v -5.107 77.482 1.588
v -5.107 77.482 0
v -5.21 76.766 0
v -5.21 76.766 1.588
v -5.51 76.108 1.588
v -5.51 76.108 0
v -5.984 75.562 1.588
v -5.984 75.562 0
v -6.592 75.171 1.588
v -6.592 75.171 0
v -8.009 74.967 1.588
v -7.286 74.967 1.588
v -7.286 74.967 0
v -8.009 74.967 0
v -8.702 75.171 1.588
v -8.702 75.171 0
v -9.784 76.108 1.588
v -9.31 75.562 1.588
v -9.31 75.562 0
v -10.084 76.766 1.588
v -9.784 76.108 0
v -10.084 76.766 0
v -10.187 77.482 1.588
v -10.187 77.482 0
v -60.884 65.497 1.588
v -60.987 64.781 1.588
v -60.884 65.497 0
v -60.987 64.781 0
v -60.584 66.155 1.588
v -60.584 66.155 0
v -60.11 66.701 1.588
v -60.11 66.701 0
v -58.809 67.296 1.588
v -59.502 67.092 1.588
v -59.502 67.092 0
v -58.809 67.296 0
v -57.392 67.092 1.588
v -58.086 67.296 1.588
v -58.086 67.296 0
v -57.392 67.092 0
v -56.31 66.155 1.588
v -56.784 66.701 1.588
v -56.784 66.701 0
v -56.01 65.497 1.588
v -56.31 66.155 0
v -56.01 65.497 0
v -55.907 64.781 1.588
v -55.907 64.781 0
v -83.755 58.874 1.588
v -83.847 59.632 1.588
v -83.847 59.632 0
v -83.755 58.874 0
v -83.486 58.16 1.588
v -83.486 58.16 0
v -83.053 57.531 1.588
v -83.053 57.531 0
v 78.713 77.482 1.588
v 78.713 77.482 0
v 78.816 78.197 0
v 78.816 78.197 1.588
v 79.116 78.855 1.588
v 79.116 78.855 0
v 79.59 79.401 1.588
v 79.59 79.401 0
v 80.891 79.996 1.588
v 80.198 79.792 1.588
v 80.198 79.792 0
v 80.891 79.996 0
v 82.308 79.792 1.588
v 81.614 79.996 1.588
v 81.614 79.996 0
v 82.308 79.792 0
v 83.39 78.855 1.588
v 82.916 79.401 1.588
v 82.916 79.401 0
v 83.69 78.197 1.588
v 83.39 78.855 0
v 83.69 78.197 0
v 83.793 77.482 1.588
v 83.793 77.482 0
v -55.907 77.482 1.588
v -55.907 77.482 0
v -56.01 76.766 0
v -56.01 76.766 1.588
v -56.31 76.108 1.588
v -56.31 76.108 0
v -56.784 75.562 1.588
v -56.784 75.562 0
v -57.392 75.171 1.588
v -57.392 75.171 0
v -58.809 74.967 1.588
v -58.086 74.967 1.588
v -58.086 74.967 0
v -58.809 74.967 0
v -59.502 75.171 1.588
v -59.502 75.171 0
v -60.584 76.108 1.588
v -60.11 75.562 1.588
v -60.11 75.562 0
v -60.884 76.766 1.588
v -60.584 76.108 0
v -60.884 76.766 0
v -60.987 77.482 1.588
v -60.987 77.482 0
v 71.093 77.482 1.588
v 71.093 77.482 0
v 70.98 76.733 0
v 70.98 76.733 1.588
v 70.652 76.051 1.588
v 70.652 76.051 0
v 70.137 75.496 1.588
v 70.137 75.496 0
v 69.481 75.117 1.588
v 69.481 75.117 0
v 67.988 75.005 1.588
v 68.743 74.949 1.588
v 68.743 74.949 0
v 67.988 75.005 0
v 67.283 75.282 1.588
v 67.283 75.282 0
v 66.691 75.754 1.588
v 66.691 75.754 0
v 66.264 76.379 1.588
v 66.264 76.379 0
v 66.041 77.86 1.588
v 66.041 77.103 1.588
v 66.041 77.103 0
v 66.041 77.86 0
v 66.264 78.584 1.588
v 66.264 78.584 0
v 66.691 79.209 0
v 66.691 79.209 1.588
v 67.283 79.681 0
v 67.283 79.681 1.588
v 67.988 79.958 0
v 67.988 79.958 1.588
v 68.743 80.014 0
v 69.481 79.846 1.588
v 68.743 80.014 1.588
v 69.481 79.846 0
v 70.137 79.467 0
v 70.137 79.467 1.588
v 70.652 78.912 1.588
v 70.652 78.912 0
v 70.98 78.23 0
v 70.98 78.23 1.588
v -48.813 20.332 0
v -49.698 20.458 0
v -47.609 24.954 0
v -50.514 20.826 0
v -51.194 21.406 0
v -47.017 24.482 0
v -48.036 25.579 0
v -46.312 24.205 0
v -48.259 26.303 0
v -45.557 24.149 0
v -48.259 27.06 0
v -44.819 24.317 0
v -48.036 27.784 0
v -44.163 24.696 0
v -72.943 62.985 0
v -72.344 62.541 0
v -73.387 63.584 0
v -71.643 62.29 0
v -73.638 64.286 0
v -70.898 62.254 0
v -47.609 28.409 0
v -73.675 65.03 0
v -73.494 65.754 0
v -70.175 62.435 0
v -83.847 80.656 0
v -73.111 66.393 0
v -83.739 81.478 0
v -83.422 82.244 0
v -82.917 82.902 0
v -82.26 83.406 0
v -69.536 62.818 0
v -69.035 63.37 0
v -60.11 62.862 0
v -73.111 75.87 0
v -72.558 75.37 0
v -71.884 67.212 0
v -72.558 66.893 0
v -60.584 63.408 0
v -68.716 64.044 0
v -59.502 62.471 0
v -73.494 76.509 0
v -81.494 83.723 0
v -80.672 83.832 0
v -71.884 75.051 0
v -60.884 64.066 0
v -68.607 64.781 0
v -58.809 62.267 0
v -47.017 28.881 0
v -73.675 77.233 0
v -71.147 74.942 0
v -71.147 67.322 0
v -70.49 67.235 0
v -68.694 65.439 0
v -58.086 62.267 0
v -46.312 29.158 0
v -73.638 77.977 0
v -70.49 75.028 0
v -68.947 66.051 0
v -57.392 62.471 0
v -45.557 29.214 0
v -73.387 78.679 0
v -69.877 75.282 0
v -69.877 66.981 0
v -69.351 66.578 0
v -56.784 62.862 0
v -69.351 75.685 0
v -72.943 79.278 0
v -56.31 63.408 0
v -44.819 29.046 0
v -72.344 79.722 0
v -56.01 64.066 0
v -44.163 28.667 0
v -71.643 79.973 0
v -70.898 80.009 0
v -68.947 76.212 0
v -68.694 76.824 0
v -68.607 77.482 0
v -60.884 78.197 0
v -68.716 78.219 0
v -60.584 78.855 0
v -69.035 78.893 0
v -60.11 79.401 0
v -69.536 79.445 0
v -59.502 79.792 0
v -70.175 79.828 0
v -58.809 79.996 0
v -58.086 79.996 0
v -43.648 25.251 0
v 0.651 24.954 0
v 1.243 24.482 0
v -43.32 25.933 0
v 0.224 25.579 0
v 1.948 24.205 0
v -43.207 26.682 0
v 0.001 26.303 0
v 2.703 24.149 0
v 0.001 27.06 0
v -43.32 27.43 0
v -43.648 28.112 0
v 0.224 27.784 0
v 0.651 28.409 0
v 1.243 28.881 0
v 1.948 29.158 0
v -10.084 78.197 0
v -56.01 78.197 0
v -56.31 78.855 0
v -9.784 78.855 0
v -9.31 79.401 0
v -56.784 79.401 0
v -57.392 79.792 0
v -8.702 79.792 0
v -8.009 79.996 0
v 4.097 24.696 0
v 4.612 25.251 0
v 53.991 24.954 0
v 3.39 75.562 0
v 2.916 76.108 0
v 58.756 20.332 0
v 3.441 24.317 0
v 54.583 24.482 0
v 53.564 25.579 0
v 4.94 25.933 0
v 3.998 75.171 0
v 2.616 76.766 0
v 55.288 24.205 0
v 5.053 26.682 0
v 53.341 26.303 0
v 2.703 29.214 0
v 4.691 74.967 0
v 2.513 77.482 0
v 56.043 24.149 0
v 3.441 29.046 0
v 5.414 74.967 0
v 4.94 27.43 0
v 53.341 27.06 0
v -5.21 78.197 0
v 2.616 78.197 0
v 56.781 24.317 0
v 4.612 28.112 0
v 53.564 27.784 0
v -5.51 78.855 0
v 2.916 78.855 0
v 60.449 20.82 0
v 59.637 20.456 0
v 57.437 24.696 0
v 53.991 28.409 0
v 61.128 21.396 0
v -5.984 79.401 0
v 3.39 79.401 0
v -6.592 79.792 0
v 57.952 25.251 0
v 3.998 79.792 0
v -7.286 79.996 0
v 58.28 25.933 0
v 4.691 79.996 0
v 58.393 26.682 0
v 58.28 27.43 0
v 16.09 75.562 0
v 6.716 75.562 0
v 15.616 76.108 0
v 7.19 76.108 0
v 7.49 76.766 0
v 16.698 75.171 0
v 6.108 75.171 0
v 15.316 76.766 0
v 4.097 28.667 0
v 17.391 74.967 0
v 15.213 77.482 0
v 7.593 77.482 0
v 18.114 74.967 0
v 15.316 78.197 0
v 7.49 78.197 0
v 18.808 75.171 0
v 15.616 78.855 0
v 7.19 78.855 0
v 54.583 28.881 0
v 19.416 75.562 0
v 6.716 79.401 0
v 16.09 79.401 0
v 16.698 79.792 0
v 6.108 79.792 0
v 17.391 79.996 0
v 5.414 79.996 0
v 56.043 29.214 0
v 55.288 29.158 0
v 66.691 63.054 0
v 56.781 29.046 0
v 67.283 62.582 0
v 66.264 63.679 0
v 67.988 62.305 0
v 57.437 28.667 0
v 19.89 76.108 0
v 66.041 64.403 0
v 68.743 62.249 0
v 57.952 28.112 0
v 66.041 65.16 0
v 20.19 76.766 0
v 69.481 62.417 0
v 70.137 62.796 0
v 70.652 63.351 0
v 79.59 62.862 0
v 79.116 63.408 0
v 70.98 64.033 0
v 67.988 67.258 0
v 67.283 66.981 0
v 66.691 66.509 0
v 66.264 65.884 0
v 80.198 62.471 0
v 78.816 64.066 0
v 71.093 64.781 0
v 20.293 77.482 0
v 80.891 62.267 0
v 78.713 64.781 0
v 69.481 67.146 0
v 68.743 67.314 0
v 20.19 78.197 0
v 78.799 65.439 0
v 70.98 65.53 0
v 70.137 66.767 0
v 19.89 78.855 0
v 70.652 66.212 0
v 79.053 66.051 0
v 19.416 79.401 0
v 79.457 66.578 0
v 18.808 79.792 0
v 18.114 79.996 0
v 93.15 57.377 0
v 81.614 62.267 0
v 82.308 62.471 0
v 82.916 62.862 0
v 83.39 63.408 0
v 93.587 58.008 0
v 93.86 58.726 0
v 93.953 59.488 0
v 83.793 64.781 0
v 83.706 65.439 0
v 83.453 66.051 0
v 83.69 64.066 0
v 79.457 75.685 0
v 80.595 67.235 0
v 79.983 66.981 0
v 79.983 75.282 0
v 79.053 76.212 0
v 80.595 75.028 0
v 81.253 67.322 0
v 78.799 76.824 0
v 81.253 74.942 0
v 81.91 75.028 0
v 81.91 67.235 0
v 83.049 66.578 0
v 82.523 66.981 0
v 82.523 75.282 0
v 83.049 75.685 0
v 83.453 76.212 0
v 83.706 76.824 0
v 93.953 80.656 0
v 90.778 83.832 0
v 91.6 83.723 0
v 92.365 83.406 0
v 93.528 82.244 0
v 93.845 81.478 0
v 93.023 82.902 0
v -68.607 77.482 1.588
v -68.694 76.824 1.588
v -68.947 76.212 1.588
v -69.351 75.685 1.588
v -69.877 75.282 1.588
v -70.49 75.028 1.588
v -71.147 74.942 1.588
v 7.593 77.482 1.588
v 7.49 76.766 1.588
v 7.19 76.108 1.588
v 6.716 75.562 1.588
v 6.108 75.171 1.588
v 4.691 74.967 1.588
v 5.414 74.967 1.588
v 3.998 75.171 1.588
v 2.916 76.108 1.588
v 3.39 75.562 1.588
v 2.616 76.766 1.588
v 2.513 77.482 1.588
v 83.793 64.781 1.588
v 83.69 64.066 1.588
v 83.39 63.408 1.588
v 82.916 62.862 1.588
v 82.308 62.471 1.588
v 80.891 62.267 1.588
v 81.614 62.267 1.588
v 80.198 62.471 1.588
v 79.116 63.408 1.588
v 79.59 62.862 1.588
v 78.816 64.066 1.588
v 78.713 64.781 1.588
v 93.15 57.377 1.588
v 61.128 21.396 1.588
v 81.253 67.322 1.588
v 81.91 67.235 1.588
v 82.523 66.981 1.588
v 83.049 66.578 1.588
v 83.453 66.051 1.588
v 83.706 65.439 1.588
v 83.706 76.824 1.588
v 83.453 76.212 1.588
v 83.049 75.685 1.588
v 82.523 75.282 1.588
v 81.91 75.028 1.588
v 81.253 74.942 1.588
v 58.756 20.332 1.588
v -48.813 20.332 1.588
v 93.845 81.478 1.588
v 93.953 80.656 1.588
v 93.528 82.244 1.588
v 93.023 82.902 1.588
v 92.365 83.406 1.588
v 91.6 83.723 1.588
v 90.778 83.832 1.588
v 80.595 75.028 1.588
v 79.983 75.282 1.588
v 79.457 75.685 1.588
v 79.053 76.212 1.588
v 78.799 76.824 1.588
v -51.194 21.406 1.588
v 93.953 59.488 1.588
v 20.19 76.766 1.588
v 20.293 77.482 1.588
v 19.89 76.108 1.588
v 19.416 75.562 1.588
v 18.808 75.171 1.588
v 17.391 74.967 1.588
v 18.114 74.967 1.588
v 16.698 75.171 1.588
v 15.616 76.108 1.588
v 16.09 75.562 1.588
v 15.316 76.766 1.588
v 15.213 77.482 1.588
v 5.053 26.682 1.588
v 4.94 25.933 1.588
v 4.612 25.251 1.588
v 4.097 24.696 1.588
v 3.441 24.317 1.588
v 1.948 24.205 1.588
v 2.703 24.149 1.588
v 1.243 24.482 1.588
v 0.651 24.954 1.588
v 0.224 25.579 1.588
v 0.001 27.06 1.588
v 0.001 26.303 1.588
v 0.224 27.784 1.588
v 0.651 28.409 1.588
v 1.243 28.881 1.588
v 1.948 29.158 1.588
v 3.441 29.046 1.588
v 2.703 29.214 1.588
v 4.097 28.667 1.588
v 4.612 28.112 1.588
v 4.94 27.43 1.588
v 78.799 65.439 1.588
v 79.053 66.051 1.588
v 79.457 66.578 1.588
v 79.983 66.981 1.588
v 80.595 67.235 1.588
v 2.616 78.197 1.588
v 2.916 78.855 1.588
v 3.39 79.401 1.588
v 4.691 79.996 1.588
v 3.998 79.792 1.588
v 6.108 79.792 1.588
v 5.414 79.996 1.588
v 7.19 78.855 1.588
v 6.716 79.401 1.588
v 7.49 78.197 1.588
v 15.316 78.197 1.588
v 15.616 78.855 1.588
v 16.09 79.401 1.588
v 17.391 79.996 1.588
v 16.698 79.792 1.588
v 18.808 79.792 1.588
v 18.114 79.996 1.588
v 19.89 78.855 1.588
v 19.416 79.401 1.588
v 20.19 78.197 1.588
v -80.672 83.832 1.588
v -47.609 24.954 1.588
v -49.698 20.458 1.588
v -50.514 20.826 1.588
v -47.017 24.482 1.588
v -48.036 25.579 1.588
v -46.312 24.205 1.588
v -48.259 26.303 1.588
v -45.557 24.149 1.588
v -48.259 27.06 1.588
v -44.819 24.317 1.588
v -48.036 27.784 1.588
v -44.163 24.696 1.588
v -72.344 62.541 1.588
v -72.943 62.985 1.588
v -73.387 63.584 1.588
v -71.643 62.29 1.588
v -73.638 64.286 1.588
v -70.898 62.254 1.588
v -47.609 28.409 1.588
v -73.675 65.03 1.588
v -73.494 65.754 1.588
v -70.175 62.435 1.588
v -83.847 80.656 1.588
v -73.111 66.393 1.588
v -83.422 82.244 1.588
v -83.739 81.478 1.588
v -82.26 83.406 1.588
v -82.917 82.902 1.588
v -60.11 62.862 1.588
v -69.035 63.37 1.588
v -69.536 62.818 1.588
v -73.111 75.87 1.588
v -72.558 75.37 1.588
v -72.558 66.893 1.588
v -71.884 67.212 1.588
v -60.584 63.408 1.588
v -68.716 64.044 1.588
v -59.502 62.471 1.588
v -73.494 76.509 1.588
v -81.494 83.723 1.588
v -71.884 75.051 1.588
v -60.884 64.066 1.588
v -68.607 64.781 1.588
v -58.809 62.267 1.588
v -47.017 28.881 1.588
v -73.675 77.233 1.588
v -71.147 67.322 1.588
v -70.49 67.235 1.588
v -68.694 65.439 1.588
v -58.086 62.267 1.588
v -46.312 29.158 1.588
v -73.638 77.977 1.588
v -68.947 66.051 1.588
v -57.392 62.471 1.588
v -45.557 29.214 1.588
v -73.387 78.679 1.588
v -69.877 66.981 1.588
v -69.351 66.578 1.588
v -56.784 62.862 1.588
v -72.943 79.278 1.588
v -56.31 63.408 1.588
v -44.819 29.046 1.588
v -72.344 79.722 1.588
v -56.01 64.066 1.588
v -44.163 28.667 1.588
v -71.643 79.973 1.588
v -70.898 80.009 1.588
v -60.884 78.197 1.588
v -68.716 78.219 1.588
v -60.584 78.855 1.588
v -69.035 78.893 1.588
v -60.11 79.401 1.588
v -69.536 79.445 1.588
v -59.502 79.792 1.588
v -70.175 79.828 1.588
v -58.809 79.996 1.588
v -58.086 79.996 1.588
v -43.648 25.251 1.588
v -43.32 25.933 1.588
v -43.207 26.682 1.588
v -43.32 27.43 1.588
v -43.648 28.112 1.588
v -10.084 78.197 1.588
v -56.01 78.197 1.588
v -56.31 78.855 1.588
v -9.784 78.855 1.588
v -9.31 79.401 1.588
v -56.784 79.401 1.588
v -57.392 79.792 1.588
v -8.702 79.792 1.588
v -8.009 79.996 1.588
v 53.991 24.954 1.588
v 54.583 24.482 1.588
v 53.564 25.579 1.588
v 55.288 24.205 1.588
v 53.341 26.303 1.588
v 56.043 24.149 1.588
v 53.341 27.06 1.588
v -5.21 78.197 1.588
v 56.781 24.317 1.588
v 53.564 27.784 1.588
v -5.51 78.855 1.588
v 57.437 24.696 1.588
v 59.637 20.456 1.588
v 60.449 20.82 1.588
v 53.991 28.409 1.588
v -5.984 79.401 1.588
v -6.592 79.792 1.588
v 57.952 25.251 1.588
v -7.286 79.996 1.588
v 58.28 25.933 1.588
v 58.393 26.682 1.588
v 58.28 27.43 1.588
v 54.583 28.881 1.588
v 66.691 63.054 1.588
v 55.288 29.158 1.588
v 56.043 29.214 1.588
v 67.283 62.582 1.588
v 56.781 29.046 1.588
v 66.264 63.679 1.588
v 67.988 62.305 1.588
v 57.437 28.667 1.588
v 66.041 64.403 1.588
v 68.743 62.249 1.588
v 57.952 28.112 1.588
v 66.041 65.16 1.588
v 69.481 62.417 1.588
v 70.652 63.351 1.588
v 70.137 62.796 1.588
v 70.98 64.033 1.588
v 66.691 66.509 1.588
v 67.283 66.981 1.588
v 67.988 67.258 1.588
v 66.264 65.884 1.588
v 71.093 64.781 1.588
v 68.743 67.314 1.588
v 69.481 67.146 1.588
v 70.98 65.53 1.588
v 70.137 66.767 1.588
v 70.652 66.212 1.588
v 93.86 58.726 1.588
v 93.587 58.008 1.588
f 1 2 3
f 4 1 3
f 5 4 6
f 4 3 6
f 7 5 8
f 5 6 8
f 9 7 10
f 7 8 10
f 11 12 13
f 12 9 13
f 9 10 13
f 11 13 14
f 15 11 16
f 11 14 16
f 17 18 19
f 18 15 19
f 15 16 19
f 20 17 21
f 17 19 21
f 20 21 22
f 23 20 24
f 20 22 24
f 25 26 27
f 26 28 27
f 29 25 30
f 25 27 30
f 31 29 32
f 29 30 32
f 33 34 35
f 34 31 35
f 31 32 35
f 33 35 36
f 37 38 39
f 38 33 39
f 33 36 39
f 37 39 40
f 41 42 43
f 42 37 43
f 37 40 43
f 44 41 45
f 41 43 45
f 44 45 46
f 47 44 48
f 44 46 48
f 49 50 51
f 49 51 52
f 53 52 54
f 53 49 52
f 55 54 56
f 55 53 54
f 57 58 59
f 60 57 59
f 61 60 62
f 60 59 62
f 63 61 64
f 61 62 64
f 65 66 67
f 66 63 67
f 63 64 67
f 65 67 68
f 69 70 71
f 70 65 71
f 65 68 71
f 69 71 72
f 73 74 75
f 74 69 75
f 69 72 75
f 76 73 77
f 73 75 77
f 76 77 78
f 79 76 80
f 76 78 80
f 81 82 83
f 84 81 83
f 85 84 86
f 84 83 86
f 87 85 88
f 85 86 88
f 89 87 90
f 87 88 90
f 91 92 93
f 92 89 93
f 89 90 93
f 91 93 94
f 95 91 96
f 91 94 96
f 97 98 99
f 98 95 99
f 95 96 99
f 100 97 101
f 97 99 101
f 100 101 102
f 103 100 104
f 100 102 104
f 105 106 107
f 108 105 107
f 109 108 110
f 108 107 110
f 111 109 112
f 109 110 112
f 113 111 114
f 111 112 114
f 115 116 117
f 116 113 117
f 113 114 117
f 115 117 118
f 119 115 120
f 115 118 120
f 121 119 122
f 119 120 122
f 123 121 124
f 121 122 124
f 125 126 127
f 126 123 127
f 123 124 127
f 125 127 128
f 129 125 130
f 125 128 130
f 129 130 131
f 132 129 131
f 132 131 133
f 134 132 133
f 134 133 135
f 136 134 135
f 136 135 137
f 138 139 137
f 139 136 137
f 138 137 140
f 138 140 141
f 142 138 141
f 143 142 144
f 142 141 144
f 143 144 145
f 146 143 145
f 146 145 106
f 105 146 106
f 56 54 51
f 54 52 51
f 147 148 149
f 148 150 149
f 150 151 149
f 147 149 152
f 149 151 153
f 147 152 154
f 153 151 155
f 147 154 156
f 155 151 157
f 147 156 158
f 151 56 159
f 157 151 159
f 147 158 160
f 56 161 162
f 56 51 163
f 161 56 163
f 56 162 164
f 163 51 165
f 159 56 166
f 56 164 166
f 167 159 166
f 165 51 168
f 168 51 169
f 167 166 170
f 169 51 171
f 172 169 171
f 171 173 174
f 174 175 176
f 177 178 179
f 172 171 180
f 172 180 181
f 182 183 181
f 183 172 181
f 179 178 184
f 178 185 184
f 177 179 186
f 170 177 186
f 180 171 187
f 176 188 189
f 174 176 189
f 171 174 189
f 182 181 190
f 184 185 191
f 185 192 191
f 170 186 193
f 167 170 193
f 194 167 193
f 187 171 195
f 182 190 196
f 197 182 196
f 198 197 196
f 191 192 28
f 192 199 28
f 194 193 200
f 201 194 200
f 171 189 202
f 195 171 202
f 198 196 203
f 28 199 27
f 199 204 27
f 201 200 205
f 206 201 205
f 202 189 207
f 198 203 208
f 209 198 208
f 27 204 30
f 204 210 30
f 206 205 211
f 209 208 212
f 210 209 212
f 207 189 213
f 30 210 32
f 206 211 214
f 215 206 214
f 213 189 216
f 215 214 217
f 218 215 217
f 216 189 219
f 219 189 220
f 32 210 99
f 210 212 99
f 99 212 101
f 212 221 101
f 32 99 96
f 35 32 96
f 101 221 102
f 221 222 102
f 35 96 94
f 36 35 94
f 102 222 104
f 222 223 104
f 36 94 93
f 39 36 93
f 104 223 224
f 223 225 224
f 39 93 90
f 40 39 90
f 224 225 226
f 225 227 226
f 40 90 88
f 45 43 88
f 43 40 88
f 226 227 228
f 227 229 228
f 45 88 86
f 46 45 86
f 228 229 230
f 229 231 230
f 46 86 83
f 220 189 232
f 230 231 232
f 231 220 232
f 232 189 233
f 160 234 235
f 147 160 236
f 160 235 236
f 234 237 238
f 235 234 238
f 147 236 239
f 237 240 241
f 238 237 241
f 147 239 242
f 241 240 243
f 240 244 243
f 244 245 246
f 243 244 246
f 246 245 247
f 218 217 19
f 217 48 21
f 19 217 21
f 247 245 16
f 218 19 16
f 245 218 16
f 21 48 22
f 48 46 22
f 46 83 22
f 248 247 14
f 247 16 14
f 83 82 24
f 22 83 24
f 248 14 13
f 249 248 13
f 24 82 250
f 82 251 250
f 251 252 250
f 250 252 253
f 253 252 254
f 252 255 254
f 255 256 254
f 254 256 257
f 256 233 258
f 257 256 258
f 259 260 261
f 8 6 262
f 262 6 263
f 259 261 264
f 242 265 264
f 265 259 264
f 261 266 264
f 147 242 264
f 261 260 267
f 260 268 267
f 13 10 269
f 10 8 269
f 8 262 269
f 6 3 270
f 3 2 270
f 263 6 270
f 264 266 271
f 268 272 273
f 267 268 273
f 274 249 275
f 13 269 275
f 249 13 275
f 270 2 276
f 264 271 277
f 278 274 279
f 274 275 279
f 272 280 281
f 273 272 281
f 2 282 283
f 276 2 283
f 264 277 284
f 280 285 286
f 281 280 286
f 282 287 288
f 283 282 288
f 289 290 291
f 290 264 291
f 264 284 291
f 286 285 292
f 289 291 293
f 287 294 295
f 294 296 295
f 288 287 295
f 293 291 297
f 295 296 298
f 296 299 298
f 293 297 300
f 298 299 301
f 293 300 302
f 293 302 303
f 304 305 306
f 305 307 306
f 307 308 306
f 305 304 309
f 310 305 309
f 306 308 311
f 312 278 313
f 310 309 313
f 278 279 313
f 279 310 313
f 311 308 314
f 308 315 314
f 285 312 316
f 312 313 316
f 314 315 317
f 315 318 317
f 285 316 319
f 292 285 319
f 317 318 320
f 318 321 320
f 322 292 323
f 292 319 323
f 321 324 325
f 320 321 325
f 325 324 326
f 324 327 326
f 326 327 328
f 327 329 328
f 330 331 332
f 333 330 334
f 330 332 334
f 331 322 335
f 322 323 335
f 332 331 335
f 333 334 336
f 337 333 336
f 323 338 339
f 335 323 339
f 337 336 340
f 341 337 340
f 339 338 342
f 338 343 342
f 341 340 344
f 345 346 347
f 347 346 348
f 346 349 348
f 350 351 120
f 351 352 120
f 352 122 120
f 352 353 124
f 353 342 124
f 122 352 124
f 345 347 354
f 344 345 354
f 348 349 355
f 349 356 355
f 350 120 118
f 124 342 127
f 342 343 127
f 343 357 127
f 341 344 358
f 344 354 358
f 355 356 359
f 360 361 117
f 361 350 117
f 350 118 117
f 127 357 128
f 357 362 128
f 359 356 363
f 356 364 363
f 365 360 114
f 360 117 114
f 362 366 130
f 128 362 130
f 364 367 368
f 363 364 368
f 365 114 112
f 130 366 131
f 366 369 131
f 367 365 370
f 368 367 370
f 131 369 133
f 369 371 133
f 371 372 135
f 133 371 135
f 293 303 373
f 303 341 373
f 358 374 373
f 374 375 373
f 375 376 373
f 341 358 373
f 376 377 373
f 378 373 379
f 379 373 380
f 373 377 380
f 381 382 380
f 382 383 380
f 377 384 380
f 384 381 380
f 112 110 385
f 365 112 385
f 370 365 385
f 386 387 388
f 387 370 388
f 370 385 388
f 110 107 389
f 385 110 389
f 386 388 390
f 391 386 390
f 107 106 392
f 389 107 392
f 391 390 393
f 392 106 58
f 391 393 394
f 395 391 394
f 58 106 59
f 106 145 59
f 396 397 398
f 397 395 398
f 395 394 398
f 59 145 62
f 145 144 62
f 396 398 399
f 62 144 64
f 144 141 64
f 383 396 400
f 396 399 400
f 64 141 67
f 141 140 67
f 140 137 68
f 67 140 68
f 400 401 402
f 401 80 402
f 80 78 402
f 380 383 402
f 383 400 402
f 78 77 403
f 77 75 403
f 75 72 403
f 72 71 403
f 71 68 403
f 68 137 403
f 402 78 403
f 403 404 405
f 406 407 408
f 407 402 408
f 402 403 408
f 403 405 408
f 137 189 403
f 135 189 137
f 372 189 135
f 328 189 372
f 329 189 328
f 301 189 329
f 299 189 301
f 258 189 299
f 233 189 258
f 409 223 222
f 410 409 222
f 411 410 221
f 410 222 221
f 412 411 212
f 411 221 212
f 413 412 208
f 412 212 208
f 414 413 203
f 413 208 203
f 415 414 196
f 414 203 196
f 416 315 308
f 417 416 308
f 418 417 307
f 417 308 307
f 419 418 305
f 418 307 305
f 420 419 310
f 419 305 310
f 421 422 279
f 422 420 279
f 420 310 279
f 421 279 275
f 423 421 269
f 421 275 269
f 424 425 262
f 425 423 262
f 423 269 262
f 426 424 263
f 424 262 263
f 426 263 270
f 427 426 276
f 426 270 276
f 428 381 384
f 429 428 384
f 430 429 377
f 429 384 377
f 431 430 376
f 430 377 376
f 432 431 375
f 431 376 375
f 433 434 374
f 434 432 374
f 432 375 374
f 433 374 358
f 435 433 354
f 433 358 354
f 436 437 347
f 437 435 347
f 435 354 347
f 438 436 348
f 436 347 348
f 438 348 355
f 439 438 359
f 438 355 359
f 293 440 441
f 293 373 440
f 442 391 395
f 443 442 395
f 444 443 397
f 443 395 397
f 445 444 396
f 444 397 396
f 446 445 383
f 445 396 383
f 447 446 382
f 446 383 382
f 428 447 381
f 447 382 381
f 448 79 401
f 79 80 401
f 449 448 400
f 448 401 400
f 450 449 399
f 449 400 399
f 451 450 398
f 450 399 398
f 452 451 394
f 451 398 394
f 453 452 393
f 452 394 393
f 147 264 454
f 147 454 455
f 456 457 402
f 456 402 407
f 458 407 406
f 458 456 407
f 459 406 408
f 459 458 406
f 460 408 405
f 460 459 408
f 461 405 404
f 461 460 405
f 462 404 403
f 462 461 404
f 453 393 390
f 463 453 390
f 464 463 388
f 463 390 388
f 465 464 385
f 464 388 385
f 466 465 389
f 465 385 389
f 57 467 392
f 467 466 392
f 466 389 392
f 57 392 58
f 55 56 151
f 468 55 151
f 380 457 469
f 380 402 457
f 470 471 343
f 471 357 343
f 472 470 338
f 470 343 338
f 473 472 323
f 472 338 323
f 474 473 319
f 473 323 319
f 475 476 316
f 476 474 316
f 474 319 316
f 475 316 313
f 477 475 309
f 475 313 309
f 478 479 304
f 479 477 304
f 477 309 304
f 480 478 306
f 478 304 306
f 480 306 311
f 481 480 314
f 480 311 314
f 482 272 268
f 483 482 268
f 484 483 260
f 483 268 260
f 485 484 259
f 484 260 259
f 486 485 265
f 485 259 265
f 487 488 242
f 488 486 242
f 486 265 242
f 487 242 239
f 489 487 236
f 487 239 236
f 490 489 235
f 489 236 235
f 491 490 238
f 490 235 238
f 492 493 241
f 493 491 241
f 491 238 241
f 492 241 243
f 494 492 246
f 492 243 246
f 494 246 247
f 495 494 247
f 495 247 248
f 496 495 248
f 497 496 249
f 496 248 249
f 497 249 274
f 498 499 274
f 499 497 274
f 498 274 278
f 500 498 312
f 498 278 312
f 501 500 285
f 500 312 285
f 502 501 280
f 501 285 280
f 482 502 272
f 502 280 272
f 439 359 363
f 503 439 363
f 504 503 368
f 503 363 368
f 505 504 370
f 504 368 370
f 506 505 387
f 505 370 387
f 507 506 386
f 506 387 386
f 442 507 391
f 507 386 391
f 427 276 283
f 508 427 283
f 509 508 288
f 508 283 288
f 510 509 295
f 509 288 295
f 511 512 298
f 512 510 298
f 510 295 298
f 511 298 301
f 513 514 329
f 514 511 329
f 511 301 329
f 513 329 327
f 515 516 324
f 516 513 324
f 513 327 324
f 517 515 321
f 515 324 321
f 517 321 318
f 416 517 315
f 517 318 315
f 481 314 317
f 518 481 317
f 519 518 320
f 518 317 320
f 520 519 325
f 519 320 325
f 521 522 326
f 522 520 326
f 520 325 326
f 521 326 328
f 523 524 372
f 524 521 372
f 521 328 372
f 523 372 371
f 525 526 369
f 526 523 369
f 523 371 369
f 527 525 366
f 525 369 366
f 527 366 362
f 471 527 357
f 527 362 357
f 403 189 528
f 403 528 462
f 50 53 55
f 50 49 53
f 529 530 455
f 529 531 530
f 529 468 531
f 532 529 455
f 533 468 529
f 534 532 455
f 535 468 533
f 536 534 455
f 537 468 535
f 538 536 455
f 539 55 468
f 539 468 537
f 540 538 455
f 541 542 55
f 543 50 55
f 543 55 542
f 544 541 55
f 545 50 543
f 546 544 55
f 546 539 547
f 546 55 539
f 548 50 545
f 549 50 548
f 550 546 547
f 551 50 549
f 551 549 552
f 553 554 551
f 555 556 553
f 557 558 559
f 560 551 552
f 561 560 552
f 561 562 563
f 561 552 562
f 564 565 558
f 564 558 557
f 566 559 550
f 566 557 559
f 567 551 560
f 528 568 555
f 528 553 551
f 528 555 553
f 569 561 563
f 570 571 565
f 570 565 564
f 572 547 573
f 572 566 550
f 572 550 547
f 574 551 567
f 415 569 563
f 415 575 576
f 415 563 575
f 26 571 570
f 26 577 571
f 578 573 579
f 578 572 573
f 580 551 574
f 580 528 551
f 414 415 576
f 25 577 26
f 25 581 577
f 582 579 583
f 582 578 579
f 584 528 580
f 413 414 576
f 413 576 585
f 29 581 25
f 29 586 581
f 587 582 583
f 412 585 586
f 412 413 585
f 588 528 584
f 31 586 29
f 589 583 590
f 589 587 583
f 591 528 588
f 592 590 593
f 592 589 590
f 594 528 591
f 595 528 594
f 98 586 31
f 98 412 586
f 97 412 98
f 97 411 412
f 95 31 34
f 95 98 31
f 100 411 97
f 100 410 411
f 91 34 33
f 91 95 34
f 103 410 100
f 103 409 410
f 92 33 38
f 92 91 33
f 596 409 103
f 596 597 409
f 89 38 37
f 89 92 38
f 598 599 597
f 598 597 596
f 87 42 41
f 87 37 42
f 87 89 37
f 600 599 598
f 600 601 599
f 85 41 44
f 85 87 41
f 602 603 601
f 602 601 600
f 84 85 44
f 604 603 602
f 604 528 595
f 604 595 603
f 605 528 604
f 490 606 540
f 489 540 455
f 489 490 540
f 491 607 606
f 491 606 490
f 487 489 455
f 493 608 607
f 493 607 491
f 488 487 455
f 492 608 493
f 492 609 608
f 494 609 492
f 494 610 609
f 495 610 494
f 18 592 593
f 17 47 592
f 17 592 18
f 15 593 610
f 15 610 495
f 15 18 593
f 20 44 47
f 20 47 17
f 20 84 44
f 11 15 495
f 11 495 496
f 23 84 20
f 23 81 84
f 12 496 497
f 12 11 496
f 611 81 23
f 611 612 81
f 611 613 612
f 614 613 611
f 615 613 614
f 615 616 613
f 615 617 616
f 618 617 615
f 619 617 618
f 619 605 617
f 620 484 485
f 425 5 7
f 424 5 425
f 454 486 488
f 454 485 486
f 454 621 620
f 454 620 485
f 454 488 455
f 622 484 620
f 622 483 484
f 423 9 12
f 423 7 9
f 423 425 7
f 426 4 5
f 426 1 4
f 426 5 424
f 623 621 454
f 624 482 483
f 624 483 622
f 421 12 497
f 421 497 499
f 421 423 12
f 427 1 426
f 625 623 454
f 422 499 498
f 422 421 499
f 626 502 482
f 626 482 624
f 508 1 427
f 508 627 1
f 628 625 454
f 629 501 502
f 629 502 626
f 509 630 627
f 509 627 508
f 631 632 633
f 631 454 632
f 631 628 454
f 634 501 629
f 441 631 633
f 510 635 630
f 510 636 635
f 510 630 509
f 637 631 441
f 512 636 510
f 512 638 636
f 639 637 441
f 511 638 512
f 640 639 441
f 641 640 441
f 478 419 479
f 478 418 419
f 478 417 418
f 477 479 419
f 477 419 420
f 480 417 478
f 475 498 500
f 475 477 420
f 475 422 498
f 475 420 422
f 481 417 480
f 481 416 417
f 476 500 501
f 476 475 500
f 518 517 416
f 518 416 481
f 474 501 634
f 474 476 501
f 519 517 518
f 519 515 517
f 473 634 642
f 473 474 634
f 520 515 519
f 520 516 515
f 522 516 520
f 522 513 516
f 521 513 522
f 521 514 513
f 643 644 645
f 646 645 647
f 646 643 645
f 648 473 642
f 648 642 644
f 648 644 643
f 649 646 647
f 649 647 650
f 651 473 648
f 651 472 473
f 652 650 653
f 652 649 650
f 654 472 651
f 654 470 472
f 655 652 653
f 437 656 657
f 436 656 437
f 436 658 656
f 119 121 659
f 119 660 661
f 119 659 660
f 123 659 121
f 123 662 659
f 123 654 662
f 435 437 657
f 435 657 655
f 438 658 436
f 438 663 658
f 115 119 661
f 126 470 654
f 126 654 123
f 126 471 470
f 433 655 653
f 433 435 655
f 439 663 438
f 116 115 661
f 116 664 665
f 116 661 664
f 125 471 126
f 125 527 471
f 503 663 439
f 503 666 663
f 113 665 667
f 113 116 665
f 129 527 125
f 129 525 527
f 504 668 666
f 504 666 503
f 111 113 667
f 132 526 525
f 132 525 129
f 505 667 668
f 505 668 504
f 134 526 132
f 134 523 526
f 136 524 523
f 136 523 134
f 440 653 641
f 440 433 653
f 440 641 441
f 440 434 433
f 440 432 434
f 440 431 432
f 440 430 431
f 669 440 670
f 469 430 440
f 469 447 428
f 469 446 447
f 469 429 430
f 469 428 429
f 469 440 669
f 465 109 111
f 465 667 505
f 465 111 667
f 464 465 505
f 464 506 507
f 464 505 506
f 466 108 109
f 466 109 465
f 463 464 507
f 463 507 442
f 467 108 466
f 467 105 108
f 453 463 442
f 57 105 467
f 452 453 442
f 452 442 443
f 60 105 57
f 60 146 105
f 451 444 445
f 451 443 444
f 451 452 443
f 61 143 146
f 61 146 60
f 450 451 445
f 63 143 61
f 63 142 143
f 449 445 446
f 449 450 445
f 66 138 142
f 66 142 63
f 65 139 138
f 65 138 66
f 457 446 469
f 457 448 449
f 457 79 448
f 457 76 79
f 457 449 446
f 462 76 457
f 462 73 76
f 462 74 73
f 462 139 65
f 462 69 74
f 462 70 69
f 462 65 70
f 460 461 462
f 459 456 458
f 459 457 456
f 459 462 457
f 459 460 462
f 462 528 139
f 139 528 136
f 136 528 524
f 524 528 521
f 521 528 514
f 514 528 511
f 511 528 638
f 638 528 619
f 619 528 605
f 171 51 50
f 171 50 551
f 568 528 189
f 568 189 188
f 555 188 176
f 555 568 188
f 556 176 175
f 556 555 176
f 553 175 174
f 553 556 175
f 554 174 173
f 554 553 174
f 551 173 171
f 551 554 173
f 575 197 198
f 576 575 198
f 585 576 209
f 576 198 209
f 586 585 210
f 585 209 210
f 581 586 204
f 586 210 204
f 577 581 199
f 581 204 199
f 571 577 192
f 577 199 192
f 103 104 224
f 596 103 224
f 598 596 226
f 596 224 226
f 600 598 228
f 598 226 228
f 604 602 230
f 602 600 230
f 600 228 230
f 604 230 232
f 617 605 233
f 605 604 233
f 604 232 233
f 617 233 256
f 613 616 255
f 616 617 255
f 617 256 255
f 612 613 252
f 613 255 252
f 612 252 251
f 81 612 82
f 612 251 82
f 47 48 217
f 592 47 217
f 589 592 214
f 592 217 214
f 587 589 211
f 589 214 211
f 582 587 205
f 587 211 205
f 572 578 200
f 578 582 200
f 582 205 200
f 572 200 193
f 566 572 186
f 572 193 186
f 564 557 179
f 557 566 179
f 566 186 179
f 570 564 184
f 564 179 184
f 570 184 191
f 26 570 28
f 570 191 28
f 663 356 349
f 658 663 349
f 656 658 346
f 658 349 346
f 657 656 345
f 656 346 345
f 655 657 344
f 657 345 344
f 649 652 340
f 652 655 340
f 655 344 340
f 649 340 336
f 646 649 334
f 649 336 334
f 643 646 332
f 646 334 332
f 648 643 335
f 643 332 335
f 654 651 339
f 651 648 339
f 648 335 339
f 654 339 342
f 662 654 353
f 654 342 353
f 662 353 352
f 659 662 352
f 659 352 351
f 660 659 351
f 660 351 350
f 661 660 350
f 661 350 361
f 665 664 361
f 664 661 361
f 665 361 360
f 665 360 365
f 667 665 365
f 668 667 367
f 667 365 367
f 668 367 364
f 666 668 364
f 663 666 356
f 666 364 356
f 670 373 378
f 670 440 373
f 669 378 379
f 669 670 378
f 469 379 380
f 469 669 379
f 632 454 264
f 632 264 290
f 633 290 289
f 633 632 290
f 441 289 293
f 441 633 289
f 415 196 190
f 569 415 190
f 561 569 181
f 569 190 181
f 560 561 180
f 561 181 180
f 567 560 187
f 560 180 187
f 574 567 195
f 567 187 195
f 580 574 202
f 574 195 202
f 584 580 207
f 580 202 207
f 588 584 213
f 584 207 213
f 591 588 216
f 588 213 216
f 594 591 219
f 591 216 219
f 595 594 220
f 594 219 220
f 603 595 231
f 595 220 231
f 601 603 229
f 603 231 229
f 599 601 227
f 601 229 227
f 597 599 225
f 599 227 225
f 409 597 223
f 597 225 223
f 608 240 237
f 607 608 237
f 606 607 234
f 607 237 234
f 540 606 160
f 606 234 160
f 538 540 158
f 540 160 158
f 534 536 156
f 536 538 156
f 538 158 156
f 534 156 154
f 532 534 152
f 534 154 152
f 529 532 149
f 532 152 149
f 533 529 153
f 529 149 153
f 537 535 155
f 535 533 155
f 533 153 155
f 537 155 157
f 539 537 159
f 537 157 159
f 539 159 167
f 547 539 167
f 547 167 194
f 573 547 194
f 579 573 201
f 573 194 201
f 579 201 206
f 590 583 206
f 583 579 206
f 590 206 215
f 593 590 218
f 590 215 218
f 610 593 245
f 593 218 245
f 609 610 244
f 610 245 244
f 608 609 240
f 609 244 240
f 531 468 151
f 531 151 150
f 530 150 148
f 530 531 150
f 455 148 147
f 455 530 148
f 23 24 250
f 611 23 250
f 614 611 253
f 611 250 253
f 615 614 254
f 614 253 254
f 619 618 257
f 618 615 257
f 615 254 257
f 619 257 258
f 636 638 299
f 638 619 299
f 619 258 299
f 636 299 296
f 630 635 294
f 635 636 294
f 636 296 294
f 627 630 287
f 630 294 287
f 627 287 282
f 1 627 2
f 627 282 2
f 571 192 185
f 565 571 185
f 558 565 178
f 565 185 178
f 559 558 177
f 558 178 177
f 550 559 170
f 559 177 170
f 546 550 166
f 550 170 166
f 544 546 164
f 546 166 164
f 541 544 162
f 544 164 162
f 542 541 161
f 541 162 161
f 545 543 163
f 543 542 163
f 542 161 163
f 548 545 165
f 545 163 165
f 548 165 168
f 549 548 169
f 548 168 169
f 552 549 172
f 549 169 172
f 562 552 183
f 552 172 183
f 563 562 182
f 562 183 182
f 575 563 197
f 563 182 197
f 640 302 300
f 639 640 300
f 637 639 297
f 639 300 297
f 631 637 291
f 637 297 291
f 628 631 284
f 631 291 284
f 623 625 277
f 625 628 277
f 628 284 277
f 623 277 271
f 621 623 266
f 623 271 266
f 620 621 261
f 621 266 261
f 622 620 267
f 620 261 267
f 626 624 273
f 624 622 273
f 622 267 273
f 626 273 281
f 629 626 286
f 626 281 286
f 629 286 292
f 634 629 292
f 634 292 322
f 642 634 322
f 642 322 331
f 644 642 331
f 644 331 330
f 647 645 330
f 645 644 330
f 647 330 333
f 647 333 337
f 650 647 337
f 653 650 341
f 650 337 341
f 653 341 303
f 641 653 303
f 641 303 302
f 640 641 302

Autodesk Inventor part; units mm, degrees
ref_plane "YZ Plane" through (0, 0, 0) normal (1, 0, 0) x (0, 1, 0)
ref_plane "XZ Plane" through (0, 0, 0) normal (0, 1, 0) x (-1, 0, 0)
ref_plane "XY Plane" through (0, 0, 0) normal (0, 0, 1) x (1, 0, 0)
sketch "Sketch1" plane through (0, 0, 0) normal (0, 0, 1) x (1, 0, 0)
  line L0 (-83.8471, 83.8315) -> (93.9529, 83.8315)
  line L1 (93.9529, 83.8315) -> (93.9529, 20.3315)
  line L2 (93.9529, 20.3315) -> (-83.8471, 20.3315)
  line L3 (-83.8471, 20.3315) -> (-83.8471, 83.8315)
  line L4 (-83.8471, 20.3315) -> (-83.8471, 58.4315)
  line L5 (93.9529, 20.3315) -> (93.9529, 58.2798)
  line L6 (93.9529, 58.2798) -> (60.1807, 20.3315)
  line L7 (-83.8471, 58.4315) -> (-50.246, 20.3315)
  circle A0 centre (-58.4471, 77.4815) radius 2.54
  circle A1 centre (68.5529, 77.4815) radius 2.54
  circle A2 centre (2.5129, 26.6815) radius 2.54
  circle A3 centre (-45.7471, 26.6815) radius 2.54
  circle A4 centre (55.8529, 26.6815) radius 2.54
  line L8 (-58.4471, 77.4815) -> (-71.1471, 77.4815)
  circle A5 centre (-71.1471, 77.4815) radius 2.54
  line L9 (-71.1471, 77.4815) -> (-71.1471, 64.7815)
  line L10 (-71.1471, 64.7815) -> (-58.4471, 64.7815)
  circle A6 centre (-71.1471, 64.7815) radius 2.54
  circle A7 centre (-58.4471, 64.7815) radius 2.54
  line L11 (-58.4471, 77.4815) -> (5.0529, 77.4815)
  line L12 (5.0529, 77.4815) -> (-7.6471, 77.4815)
  circle A8 centre (-7.6471, 77.4815) radius 2.54
  circle A9 centre (5.0529, 77.4815) radius 2.54
  line L13 (5.0529, 77.4815) -> (17.7529, 77.4815)
  circle A10 centre (17.7529, 77.4815) radius 2.54
  line L14 (68.5529, 77.4815) -> (81.2529, 77.4815)
  line L15 (81.2529, 77.4815) -> (81.2529, 64.7815)
  line L16 (81.2529, 64.7815) -> (68.5529, 64.7815)
  circle A11 centre (81.2529, 77.4815) radius 2.54
  circle A12 centre (81.2529, 64.7815) radius 2.54
  circle A13 centre (68.5529, 64.7815) radius 2.54
  point P0 (0, 0)
  dimension "d0" = 177.8
  dimension "d1" = 63.5
  dimension "d2" = 38.1
  dimension "d3" = 50.8
  dimension "d4" = 50.8
  dimension "d18" = 6.35
  dimension "d19" = 25.4
  dimension "d20" = 5.08
  dimension "d21" = 5.08
  dimension "d22" = 6.35
  dimension "d23" = 25.4
  dimension "d24" = 5.08
  dimension "d25" = 6.35
  dimension "d26" = 86.36
  dimension "d29" = 6.35
  dimension "d30" = 6.35
  dimension "d31" = 38.1
  dimension "d32" = 38.1
  dimension "d33" = 5.08
  dimension "d34" = 5.08
  dimension "d39" = 12.7
  dimension "d40" = 5.08
  dimension "d41" = 12.7
  dimension "d42" = 5.08
  dimension "d43" = 5.08
  dimension "d44" = 12.7
  dimension "d45" = 5.08
  dimension "d46" = 5.08
  dimension "d47" = 12.7
  dimension "d48" = 5.08
  dimension "d49" = 12.7
  dimension "d50" = 12.7
  dimension "d51" = 12.7
  dimension "d52" = 5.08
  dimension "d53" = 5.08
  dimension "d54" = 5.08
extrude "Extrusion3" add sketch "Sketch1" along normal blind 1.5875 contours L0 L1 L6 L2 L7 L3
fillet "Fillet6" radius 3.175 4 edges at (-83.8471, 58.4315, 0.7937) (-50.246, 20.3315, 0.7937) (60.1807, 20.3315, 0.7937) (-83.8471, 83.8315, 0.7937)
fillet "Fillet7" radius 3.175 2 edges at (93.9529, 83.8315, 0.7937) (93.9529, 58.2798, 0.7937)
properties part number "wedge"
